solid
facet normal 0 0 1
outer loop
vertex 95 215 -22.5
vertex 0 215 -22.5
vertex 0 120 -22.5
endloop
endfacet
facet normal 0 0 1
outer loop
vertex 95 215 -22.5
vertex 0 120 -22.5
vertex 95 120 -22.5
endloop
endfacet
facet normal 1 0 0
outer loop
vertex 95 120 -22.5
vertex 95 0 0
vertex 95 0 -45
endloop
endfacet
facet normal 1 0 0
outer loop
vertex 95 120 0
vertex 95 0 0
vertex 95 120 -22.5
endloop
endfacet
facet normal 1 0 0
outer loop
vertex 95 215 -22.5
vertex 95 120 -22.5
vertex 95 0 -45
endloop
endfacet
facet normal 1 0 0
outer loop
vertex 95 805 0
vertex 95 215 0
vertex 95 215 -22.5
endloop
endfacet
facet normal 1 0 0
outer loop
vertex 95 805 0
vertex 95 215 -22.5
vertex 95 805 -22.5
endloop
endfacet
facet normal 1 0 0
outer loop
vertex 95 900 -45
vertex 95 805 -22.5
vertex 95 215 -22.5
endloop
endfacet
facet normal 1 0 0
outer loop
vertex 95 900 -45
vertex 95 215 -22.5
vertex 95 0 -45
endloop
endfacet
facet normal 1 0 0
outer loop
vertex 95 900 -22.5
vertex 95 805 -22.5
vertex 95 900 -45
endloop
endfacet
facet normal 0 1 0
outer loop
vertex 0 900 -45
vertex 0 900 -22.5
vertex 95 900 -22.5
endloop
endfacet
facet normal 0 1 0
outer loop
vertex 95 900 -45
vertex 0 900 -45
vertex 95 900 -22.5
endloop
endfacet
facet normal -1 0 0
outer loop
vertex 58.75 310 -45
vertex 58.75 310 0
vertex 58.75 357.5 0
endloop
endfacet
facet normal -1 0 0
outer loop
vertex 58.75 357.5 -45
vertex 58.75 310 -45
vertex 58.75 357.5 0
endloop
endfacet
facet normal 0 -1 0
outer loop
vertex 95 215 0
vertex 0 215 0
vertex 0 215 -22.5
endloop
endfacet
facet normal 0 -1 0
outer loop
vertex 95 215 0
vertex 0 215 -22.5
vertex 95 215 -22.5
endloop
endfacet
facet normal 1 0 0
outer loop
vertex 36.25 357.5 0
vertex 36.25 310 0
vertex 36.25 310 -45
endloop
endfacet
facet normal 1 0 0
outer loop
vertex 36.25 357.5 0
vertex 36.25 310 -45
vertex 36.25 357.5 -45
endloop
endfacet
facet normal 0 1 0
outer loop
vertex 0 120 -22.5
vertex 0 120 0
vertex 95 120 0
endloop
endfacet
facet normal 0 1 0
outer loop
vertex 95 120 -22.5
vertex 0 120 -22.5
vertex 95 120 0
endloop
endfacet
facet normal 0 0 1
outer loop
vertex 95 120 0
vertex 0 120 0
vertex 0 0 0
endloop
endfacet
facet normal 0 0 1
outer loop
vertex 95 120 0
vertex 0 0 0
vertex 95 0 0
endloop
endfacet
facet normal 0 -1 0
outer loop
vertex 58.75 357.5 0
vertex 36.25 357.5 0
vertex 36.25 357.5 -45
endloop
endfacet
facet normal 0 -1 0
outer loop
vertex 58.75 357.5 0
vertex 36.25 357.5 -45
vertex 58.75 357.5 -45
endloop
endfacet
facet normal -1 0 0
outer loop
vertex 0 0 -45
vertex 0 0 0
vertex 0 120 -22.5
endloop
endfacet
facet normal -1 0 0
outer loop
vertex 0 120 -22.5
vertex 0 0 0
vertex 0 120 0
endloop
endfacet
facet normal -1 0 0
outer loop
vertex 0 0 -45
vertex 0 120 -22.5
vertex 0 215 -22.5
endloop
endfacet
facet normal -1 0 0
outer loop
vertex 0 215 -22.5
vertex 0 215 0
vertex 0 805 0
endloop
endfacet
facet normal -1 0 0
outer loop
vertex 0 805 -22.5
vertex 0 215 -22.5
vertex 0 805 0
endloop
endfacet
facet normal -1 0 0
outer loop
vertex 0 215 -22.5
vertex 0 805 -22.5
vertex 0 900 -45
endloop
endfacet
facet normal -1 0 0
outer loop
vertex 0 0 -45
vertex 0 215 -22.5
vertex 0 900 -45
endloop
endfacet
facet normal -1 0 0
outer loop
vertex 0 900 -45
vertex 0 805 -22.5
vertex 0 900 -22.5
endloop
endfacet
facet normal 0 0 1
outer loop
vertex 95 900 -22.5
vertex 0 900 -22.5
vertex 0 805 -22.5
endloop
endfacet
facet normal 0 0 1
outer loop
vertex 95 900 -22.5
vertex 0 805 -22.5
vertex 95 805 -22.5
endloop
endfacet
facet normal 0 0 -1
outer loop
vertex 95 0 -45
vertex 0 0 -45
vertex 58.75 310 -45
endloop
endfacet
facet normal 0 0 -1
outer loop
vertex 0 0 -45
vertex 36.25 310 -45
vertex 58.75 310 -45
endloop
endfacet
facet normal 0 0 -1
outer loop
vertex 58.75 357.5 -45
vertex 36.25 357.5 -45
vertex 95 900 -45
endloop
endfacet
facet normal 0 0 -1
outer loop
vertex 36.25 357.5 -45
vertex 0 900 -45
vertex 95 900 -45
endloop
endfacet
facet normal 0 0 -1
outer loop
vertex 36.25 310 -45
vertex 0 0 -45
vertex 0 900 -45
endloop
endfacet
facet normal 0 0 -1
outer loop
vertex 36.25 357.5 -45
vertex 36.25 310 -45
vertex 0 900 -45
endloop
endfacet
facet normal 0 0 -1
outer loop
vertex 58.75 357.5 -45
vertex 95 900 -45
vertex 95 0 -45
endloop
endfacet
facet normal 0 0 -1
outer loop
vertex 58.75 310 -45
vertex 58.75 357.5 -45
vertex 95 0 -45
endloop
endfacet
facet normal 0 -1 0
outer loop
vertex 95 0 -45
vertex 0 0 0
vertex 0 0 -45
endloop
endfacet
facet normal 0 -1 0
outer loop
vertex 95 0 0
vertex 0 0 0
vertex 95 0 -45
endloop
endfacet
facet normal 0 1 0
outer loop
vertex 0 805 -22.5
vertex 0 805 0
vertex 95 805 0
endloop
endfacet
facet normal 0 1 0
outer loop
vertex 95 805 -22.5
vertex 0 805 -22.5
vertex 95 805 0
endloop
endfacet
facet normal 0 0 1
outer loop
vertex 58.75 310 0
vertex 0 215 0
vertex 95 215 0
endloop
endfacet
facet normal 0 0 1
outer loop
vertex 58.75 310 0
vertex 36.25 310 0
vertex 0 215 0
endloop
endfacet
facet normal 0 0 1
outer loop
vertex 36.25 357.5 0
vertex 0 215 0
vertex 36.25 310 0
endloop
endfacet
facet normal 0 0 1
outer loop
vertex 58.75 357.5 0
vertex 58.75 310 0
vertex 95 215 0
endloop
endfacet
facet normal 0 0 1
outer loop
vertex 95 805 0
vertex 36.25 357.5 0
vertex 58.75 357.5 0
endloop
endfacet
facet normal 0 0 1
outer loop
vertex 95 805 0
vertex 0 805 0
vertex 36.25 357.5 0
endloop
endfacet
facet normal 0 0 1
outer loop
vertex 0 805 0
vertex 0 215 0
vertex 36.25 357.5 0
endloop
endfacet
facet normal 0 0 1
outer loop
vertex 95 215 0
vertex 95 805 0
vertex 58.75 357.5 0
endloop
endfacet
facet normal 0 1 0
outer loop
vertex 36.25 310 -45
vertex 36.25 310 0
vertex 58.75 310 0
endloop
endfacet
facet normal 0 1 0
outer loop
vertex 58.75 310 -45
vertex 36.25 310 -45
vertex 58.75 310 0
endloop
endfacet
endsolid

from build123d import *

# Parameters (mm, degrees)
SKETCH_W        = 95
SKETCH_H        = 900
PAD_DEPTH       = 45
SKETCH001_W     = 95
SKETCH001_H     = 95
SKETCH001_W_2   = 22.5
SKETCH001_H_2   = 47.5
POCKET_DEPTH    = 22.5
SKETCH011_W     = 22.5
SKETCH011_H     = 47.5
POCKET006_DEPTH = 22.5


with BuildPart() as part:
    # Sketch → Pad (new body)
    with BuildSketch(Plane.XY):
        with Locations((47.5, 450)):
            Rectangle(SKETCH_W, SKETCH_H)
    extrude(amount=-PAD_DEPTH)

    # Sketch001 (on Face5 of Pad) → Pocket (cut)
    with BuildSketch(Plane.XY):
        with Locations((47.5, 167.5)):
            Rectangle(SKETCH001_W, SKETCH001_H)
        with Locations((47.5, 852.5)):
            Rectangle(SKETCH001_W, SKETCH001_H)
        with Locations((47.5, 333.75)):
            Rectangle(SKETCH001_W_2, SKETCH001_H_2)
    extrude(amount=-POCKET_DEPTH, mode=Mode.SUBTRACT)

    # Sketch011 (on Face4 of Pocket) → Pocket006 (cut)
    with BuildSketch(Plane(origin=(0, 0, -45), x_dir=(1, 0, 0), z_dir=(0, 0, -1))):
        with Locations((47.5, -333.75)):
            Rectangle(SKETCH011_W, SKETCH011_H)
    extrude(amount=-POCKET006_DEPTH, mode=Mode.SUBTRACT)


solid = part.part
